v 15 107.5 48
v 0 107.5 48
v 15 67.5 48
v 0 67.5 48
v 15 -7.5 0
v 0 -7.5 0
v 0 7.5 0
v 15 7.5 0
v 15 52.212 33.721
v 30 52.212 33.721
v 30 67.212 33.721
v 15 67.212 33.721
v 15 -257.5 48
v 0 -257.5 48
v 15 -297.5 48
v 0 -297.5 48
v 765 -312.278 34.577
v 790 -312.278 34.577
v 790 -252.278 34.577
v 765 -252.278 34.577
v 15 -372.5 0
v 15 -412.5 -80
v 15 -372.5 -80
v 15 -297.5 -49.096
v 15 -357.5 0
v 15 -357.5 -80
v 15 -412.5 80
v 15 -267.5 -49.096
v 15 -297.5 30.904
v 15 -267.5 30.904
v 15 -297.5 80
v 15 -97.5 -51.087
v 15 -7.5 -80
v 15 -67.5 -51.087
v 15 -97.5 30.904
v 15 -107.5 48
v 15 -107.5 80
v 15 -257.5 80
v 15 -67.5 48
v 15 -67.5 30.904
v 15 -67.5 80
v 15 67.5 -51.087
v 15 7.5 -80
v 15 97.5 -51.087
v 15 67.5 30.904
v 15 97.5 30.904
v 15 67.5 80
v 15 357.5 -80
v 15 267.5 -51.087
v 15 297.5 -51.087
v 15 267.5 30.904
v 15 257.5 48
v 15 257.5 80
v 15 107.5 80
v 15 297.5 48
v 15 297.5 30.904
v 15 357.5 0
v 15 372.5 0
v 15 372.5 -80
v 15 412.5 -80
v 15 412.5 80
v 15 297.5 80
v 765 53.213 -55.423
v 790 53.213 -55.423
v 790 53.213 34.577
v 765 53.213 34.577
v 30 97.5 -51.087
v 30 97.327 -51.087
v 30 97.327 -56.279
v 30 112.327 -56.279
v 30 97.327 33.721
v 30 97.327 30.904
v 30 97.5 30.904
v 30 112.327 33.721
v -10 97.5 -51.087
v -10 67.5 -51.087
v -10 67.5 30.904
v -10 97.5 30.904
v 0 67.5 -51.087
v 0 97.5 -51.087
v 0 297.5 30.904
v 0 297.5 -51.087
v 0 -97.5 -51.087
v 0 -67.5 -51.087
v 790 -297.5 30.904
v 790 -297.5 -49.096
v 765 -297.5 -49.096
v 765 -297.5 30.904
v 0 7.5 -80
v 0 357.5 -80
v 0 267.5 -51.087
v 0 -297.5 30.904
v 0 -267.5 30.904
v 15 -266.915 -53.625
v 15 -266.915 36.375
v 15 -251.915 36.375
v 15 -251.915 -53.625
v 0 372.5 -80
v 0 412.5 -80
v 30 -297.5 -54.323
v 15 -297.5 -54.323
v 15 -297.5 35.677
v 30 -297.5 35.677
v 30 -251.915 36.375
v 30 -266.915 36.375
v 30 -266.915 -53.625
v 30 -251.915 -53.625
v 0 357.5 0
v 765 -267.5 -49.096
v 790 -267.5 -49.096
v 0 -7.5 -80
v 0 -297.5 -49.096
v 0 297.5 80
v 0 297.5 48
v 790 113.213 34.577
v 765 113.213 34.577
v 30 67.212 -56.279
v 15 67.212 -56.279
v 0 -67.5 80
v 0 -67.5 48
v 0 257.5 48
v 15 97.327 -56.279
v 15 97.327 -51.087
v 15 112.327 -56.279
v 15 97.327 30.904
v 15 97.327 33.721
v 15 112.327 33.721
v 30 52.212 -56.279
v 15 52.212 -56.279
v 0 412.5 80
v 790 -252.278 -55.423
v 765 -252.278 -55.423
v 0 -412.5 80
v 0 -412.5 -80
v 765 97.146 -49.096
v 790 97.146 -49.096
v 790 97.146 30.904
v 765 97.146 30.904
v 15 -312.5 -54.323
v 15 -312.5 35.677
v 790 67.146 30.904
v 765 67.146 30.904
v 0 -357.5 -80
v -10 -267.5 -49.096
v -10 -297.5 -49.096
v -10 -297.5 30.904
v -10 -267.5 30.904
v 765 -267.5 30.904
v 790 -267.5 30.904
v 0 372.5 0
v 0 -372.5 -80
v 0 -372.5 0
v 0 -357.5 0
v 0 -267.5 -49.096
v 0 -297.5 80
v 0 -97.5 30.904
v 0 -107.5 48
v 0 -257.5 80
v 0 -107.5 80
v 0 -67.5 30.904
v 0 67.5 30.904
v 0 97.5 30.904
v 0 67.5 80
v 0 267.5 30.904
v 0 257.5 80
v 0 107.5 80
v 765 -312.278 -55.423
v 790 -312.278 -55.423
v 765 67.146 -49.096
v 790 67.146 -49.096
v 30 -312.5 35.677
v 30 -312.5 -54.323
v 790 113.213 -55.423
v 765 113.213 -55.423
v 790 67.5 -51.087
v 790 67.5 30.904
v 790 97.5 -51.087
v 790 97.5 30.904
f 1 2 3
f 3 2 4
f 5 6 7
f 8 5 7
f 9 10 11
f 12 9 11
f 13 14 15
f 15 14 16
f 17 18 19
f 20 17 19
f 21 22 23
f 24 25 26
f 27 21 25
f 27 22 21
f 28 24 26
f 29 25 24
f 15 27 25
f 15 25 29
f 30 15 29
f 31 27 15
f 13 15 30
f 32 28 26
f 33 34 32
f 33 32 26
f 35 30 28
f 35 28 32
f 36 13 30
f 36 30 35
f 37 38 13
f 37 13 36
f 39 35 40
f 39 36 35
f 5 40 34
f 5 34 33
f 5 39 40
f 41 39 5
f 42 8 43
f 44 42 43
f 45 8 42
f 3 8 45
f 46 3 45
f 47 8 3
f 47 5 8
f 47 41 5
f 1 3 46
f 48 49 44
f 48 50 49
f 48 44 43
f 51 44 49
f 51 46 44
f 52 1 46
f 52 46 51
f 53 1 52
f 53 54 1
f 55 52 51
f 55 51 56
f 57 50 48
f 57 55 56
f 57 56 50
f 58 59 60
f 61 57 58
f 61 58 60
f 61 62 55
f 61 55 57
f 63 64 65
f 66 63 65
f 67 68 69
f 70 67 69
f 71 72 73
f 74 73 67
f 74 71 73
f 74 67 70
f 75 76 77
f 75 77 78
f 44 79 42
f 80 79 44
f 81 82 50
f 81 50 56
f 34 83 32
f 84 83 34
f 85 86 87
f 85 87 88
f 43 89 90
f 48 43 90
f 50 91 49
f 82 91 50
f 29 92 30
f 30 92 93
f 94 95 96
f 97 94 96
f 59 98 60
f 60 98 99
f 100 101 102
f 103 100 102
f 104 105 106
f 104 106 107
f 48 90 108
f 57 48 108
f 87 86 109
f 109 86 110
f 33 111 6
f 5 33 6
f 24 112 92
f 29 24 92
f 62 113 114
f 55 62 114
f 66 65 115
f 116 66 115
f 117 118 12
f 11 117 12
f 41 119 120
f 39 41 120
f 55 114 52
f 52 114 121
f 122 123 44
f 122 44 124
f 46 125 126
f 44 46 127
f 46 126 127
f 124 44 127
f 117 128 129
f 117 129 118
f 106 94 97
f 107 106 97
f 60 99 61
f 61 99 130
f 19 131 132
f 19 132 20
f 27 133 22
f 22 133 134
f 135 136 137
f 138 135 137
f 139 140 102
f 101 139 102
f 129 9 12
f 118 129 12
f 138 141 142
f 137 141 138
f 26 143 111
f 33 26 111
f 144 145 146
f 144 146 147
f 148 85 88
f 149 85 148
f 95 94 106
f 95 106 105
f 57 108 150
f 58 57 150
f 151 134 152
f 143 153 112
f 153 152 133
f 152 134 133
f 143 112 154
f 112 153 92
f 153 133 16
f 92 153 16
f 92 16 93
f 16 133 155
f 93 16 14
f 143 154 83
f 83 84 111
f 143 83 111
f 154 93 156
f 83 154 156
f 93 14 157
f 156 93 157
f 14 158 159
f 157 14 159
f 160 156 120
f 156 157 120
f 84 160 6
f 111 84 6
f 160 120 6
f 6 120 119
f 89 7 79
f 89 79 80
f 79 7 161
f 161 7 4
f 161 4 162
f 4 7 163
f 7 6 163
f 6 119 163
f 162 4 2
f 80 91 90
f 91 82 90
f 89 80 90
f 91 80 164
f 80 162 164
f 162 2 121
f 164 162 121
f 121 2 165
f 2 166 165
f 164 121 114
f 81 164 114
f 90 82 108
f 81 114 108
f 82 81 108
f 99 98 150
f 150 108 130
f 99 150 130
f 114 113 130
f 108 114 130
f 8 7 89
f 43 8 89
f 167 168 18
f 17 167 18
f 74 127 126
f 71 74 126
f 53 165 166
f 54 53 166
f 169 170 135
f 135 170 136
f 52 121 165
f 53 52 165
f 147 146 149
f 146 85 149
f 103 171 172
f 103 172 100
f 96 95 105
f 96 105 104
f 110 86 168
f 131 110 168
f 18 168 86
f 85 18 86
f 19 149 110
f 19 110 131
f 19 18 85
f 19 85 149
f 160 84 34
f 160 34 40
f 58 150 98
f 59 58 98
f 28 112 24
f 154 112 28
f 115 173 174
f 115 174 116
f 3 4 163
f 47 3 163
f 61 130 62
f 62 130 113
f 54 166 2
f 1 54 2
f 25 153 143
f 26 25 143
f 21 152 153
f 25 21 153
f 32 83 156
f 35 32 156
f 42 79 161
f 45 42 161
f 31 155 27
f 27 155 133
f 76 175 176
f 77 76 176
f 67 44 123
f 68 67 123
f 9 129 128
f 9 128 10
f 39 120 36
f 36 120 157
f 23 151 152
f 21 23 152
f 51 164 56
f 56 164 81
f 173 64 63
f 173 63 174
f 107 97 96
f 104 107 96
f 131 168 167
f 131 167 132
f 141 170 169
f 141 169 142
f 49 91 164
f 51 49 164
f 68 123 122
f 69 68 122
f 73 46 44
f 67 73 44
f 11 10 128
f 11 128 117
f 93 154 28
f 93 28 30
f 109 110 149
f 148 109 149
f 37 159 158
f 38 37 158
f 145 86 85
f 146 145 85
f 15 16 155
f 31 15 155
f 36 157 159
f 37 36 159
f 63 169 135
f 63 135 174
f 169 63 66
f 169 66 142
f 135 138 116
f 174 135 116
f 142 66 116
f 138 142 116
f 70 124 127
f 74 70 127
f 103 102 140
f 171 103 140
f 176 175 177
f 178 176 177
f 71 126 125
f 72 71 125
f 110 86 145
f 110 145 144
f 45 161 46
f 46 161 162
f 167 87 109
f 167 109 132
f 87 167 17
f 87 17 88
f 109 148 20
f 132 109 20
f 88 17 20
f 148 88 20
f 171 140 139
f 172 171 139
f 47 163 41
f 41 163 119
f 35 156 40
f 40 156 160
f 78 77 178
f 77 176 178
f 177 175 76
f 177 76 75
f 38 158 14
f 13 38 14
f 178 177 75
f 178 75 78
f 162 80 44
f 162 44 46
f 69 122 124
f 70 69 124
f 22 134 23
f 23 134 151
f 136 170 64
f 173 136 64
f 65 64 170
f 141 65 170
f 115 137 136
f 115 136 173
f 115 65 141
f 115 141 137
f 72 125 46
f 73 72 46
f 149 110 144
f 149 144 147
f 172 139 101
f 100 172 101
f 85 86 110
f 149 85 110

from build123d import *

# Parameters (mm, degrees)
F0_W          = 30
F0_H          = 80
F0_H_2        = 81.990397
F1_DEPTH      = 15
F2_W          = 15
F2_H          = 90
F3_DEPTH      = 15
F4_W          = 30
F4_H          = 81.990397
F4_H_2        = 80
F5_DEPTH      = 775
F5_DEPTH_BACK = 25
F6_W          = 60
F6_H          = 90
F6_W_2        = 30
F6_H_2        = 80
F7_DEPTH      = 25


with BuildPart() as f1:
    # F0 (on Right) → F1 (new body)
    with BuildSketch(Plane.YZ):
        Polygon((-297.5, 80), (-412.5, 80), (-412.5, -80), (-372.5, -80), (-372.5, 0), (-357.5, 0), (-357.5, -80), (-332.5, -80), (-7.5, -80), (-7.5, 0), (7.5, 0), (7.5, -80), (332.5, -80), (357.5, -80), (357.5, 0), (372.5, 0), (372.5, -80), (412.5, -80), (412.5, 80), (297.5, 80), (297.5, 48), (257.5, 48), (257.5, 80), (107.5, 80), (107.5, 48), (67.5, 48), (67.5, 80), (-67.5, 80), (-67.5, 48), (-107.5, 48), (-107.5, 80), (-257.5, 80), (-257.5, 48), (-297.5, 48), align=None)
        with Locations((-282.5, -9.096409)):
            Rectangle(F0_W, F0_H, mode=Mode.SUBTRACT)
        with Locations((-82.5, -10.091607)):
            Rectangle(F0_W, F0_H_2, mode=Mode.SUBTRACT)
        with Locations((82.5, -10.091607)):
            Rectangle(F0_W, F0_H_2, mode=Mode.SUBTRACT)
        with Locations((282.5, -10.091607)):
            Rectangle(F0_W, F0_H_2, mode=Mode.SUBTRACT)
    extrude(amount=F1_DEPTH)


with BuildPart() as f3:
    # F2 (on face) → F3 (new body)
    with BuildSketch(Plane.YZ.offset(15)):
        Polygon((-297.5, 30.903591), (-297.5, 35.676506), (-312.5, 35.676506), (-312.5, -54.323494), (-297.5, -54.323494), (-297.5, -49.096409), align=None)
        with Locations((-259.414852, -8.625042)):
            Rectangle(F2_W, F2_H)
        with Locations((59.711874, -11.278906)):
            Rectangle(F2_W, F2_H)
        Polygon((112.327493, -56.278904), (112.327493, 33.721096), (97.327493, 33.721096), (97.327493, 30.903591), (97.5, 30.903591), (97.5, -51.086806), (97.327493, -51.086806), (97.327493, -56.278904), align=None)
    extrude(amount=F3_DEPTH)


with BuildPart() as f5:
    # F4 (on face) → F5 (new body, two sides)
    with BuildSketch(Plane.YZ.offset(15)) as f5_sk:
        with Locations((82.5, -10.091607)):
            Rectangle(F4_W, F4_H)
        with Locations((-282.5, -9.096409)):
            Rectangle(F4_W, F4_H_2)
    extrude(amount=F5_DEPTH)
    extrude(f5_sk.sketch, amount=-F5_DEPTH_BACK)


with BuildPart() as f7:
    # F6 (on face) → F7 (new body)
    with BuildSketch(Plane.YZ.offset(790)):
        with Locations((-282.277718, -10.423334)):
            Rectangle(F6_W, F6_H)
        with Locations((-282.5, -9.096409)):
            Rectangle(F6_W_2, F6_H_2, mode=Mode.SUBTRACT)
        with Locations((83.213313, -10.423334)):
            Rectangle(F6_W, F6_H)
        with Locations((82.146078, -9.096409)):
            Rectangle(F6_W_2, F6_H_2, mode=Mode.SUBTRACT)
    extrude(amount=-F7_DEPTH)


solid = Compound([f1.part, f3.part, f5.part, f7.part])
